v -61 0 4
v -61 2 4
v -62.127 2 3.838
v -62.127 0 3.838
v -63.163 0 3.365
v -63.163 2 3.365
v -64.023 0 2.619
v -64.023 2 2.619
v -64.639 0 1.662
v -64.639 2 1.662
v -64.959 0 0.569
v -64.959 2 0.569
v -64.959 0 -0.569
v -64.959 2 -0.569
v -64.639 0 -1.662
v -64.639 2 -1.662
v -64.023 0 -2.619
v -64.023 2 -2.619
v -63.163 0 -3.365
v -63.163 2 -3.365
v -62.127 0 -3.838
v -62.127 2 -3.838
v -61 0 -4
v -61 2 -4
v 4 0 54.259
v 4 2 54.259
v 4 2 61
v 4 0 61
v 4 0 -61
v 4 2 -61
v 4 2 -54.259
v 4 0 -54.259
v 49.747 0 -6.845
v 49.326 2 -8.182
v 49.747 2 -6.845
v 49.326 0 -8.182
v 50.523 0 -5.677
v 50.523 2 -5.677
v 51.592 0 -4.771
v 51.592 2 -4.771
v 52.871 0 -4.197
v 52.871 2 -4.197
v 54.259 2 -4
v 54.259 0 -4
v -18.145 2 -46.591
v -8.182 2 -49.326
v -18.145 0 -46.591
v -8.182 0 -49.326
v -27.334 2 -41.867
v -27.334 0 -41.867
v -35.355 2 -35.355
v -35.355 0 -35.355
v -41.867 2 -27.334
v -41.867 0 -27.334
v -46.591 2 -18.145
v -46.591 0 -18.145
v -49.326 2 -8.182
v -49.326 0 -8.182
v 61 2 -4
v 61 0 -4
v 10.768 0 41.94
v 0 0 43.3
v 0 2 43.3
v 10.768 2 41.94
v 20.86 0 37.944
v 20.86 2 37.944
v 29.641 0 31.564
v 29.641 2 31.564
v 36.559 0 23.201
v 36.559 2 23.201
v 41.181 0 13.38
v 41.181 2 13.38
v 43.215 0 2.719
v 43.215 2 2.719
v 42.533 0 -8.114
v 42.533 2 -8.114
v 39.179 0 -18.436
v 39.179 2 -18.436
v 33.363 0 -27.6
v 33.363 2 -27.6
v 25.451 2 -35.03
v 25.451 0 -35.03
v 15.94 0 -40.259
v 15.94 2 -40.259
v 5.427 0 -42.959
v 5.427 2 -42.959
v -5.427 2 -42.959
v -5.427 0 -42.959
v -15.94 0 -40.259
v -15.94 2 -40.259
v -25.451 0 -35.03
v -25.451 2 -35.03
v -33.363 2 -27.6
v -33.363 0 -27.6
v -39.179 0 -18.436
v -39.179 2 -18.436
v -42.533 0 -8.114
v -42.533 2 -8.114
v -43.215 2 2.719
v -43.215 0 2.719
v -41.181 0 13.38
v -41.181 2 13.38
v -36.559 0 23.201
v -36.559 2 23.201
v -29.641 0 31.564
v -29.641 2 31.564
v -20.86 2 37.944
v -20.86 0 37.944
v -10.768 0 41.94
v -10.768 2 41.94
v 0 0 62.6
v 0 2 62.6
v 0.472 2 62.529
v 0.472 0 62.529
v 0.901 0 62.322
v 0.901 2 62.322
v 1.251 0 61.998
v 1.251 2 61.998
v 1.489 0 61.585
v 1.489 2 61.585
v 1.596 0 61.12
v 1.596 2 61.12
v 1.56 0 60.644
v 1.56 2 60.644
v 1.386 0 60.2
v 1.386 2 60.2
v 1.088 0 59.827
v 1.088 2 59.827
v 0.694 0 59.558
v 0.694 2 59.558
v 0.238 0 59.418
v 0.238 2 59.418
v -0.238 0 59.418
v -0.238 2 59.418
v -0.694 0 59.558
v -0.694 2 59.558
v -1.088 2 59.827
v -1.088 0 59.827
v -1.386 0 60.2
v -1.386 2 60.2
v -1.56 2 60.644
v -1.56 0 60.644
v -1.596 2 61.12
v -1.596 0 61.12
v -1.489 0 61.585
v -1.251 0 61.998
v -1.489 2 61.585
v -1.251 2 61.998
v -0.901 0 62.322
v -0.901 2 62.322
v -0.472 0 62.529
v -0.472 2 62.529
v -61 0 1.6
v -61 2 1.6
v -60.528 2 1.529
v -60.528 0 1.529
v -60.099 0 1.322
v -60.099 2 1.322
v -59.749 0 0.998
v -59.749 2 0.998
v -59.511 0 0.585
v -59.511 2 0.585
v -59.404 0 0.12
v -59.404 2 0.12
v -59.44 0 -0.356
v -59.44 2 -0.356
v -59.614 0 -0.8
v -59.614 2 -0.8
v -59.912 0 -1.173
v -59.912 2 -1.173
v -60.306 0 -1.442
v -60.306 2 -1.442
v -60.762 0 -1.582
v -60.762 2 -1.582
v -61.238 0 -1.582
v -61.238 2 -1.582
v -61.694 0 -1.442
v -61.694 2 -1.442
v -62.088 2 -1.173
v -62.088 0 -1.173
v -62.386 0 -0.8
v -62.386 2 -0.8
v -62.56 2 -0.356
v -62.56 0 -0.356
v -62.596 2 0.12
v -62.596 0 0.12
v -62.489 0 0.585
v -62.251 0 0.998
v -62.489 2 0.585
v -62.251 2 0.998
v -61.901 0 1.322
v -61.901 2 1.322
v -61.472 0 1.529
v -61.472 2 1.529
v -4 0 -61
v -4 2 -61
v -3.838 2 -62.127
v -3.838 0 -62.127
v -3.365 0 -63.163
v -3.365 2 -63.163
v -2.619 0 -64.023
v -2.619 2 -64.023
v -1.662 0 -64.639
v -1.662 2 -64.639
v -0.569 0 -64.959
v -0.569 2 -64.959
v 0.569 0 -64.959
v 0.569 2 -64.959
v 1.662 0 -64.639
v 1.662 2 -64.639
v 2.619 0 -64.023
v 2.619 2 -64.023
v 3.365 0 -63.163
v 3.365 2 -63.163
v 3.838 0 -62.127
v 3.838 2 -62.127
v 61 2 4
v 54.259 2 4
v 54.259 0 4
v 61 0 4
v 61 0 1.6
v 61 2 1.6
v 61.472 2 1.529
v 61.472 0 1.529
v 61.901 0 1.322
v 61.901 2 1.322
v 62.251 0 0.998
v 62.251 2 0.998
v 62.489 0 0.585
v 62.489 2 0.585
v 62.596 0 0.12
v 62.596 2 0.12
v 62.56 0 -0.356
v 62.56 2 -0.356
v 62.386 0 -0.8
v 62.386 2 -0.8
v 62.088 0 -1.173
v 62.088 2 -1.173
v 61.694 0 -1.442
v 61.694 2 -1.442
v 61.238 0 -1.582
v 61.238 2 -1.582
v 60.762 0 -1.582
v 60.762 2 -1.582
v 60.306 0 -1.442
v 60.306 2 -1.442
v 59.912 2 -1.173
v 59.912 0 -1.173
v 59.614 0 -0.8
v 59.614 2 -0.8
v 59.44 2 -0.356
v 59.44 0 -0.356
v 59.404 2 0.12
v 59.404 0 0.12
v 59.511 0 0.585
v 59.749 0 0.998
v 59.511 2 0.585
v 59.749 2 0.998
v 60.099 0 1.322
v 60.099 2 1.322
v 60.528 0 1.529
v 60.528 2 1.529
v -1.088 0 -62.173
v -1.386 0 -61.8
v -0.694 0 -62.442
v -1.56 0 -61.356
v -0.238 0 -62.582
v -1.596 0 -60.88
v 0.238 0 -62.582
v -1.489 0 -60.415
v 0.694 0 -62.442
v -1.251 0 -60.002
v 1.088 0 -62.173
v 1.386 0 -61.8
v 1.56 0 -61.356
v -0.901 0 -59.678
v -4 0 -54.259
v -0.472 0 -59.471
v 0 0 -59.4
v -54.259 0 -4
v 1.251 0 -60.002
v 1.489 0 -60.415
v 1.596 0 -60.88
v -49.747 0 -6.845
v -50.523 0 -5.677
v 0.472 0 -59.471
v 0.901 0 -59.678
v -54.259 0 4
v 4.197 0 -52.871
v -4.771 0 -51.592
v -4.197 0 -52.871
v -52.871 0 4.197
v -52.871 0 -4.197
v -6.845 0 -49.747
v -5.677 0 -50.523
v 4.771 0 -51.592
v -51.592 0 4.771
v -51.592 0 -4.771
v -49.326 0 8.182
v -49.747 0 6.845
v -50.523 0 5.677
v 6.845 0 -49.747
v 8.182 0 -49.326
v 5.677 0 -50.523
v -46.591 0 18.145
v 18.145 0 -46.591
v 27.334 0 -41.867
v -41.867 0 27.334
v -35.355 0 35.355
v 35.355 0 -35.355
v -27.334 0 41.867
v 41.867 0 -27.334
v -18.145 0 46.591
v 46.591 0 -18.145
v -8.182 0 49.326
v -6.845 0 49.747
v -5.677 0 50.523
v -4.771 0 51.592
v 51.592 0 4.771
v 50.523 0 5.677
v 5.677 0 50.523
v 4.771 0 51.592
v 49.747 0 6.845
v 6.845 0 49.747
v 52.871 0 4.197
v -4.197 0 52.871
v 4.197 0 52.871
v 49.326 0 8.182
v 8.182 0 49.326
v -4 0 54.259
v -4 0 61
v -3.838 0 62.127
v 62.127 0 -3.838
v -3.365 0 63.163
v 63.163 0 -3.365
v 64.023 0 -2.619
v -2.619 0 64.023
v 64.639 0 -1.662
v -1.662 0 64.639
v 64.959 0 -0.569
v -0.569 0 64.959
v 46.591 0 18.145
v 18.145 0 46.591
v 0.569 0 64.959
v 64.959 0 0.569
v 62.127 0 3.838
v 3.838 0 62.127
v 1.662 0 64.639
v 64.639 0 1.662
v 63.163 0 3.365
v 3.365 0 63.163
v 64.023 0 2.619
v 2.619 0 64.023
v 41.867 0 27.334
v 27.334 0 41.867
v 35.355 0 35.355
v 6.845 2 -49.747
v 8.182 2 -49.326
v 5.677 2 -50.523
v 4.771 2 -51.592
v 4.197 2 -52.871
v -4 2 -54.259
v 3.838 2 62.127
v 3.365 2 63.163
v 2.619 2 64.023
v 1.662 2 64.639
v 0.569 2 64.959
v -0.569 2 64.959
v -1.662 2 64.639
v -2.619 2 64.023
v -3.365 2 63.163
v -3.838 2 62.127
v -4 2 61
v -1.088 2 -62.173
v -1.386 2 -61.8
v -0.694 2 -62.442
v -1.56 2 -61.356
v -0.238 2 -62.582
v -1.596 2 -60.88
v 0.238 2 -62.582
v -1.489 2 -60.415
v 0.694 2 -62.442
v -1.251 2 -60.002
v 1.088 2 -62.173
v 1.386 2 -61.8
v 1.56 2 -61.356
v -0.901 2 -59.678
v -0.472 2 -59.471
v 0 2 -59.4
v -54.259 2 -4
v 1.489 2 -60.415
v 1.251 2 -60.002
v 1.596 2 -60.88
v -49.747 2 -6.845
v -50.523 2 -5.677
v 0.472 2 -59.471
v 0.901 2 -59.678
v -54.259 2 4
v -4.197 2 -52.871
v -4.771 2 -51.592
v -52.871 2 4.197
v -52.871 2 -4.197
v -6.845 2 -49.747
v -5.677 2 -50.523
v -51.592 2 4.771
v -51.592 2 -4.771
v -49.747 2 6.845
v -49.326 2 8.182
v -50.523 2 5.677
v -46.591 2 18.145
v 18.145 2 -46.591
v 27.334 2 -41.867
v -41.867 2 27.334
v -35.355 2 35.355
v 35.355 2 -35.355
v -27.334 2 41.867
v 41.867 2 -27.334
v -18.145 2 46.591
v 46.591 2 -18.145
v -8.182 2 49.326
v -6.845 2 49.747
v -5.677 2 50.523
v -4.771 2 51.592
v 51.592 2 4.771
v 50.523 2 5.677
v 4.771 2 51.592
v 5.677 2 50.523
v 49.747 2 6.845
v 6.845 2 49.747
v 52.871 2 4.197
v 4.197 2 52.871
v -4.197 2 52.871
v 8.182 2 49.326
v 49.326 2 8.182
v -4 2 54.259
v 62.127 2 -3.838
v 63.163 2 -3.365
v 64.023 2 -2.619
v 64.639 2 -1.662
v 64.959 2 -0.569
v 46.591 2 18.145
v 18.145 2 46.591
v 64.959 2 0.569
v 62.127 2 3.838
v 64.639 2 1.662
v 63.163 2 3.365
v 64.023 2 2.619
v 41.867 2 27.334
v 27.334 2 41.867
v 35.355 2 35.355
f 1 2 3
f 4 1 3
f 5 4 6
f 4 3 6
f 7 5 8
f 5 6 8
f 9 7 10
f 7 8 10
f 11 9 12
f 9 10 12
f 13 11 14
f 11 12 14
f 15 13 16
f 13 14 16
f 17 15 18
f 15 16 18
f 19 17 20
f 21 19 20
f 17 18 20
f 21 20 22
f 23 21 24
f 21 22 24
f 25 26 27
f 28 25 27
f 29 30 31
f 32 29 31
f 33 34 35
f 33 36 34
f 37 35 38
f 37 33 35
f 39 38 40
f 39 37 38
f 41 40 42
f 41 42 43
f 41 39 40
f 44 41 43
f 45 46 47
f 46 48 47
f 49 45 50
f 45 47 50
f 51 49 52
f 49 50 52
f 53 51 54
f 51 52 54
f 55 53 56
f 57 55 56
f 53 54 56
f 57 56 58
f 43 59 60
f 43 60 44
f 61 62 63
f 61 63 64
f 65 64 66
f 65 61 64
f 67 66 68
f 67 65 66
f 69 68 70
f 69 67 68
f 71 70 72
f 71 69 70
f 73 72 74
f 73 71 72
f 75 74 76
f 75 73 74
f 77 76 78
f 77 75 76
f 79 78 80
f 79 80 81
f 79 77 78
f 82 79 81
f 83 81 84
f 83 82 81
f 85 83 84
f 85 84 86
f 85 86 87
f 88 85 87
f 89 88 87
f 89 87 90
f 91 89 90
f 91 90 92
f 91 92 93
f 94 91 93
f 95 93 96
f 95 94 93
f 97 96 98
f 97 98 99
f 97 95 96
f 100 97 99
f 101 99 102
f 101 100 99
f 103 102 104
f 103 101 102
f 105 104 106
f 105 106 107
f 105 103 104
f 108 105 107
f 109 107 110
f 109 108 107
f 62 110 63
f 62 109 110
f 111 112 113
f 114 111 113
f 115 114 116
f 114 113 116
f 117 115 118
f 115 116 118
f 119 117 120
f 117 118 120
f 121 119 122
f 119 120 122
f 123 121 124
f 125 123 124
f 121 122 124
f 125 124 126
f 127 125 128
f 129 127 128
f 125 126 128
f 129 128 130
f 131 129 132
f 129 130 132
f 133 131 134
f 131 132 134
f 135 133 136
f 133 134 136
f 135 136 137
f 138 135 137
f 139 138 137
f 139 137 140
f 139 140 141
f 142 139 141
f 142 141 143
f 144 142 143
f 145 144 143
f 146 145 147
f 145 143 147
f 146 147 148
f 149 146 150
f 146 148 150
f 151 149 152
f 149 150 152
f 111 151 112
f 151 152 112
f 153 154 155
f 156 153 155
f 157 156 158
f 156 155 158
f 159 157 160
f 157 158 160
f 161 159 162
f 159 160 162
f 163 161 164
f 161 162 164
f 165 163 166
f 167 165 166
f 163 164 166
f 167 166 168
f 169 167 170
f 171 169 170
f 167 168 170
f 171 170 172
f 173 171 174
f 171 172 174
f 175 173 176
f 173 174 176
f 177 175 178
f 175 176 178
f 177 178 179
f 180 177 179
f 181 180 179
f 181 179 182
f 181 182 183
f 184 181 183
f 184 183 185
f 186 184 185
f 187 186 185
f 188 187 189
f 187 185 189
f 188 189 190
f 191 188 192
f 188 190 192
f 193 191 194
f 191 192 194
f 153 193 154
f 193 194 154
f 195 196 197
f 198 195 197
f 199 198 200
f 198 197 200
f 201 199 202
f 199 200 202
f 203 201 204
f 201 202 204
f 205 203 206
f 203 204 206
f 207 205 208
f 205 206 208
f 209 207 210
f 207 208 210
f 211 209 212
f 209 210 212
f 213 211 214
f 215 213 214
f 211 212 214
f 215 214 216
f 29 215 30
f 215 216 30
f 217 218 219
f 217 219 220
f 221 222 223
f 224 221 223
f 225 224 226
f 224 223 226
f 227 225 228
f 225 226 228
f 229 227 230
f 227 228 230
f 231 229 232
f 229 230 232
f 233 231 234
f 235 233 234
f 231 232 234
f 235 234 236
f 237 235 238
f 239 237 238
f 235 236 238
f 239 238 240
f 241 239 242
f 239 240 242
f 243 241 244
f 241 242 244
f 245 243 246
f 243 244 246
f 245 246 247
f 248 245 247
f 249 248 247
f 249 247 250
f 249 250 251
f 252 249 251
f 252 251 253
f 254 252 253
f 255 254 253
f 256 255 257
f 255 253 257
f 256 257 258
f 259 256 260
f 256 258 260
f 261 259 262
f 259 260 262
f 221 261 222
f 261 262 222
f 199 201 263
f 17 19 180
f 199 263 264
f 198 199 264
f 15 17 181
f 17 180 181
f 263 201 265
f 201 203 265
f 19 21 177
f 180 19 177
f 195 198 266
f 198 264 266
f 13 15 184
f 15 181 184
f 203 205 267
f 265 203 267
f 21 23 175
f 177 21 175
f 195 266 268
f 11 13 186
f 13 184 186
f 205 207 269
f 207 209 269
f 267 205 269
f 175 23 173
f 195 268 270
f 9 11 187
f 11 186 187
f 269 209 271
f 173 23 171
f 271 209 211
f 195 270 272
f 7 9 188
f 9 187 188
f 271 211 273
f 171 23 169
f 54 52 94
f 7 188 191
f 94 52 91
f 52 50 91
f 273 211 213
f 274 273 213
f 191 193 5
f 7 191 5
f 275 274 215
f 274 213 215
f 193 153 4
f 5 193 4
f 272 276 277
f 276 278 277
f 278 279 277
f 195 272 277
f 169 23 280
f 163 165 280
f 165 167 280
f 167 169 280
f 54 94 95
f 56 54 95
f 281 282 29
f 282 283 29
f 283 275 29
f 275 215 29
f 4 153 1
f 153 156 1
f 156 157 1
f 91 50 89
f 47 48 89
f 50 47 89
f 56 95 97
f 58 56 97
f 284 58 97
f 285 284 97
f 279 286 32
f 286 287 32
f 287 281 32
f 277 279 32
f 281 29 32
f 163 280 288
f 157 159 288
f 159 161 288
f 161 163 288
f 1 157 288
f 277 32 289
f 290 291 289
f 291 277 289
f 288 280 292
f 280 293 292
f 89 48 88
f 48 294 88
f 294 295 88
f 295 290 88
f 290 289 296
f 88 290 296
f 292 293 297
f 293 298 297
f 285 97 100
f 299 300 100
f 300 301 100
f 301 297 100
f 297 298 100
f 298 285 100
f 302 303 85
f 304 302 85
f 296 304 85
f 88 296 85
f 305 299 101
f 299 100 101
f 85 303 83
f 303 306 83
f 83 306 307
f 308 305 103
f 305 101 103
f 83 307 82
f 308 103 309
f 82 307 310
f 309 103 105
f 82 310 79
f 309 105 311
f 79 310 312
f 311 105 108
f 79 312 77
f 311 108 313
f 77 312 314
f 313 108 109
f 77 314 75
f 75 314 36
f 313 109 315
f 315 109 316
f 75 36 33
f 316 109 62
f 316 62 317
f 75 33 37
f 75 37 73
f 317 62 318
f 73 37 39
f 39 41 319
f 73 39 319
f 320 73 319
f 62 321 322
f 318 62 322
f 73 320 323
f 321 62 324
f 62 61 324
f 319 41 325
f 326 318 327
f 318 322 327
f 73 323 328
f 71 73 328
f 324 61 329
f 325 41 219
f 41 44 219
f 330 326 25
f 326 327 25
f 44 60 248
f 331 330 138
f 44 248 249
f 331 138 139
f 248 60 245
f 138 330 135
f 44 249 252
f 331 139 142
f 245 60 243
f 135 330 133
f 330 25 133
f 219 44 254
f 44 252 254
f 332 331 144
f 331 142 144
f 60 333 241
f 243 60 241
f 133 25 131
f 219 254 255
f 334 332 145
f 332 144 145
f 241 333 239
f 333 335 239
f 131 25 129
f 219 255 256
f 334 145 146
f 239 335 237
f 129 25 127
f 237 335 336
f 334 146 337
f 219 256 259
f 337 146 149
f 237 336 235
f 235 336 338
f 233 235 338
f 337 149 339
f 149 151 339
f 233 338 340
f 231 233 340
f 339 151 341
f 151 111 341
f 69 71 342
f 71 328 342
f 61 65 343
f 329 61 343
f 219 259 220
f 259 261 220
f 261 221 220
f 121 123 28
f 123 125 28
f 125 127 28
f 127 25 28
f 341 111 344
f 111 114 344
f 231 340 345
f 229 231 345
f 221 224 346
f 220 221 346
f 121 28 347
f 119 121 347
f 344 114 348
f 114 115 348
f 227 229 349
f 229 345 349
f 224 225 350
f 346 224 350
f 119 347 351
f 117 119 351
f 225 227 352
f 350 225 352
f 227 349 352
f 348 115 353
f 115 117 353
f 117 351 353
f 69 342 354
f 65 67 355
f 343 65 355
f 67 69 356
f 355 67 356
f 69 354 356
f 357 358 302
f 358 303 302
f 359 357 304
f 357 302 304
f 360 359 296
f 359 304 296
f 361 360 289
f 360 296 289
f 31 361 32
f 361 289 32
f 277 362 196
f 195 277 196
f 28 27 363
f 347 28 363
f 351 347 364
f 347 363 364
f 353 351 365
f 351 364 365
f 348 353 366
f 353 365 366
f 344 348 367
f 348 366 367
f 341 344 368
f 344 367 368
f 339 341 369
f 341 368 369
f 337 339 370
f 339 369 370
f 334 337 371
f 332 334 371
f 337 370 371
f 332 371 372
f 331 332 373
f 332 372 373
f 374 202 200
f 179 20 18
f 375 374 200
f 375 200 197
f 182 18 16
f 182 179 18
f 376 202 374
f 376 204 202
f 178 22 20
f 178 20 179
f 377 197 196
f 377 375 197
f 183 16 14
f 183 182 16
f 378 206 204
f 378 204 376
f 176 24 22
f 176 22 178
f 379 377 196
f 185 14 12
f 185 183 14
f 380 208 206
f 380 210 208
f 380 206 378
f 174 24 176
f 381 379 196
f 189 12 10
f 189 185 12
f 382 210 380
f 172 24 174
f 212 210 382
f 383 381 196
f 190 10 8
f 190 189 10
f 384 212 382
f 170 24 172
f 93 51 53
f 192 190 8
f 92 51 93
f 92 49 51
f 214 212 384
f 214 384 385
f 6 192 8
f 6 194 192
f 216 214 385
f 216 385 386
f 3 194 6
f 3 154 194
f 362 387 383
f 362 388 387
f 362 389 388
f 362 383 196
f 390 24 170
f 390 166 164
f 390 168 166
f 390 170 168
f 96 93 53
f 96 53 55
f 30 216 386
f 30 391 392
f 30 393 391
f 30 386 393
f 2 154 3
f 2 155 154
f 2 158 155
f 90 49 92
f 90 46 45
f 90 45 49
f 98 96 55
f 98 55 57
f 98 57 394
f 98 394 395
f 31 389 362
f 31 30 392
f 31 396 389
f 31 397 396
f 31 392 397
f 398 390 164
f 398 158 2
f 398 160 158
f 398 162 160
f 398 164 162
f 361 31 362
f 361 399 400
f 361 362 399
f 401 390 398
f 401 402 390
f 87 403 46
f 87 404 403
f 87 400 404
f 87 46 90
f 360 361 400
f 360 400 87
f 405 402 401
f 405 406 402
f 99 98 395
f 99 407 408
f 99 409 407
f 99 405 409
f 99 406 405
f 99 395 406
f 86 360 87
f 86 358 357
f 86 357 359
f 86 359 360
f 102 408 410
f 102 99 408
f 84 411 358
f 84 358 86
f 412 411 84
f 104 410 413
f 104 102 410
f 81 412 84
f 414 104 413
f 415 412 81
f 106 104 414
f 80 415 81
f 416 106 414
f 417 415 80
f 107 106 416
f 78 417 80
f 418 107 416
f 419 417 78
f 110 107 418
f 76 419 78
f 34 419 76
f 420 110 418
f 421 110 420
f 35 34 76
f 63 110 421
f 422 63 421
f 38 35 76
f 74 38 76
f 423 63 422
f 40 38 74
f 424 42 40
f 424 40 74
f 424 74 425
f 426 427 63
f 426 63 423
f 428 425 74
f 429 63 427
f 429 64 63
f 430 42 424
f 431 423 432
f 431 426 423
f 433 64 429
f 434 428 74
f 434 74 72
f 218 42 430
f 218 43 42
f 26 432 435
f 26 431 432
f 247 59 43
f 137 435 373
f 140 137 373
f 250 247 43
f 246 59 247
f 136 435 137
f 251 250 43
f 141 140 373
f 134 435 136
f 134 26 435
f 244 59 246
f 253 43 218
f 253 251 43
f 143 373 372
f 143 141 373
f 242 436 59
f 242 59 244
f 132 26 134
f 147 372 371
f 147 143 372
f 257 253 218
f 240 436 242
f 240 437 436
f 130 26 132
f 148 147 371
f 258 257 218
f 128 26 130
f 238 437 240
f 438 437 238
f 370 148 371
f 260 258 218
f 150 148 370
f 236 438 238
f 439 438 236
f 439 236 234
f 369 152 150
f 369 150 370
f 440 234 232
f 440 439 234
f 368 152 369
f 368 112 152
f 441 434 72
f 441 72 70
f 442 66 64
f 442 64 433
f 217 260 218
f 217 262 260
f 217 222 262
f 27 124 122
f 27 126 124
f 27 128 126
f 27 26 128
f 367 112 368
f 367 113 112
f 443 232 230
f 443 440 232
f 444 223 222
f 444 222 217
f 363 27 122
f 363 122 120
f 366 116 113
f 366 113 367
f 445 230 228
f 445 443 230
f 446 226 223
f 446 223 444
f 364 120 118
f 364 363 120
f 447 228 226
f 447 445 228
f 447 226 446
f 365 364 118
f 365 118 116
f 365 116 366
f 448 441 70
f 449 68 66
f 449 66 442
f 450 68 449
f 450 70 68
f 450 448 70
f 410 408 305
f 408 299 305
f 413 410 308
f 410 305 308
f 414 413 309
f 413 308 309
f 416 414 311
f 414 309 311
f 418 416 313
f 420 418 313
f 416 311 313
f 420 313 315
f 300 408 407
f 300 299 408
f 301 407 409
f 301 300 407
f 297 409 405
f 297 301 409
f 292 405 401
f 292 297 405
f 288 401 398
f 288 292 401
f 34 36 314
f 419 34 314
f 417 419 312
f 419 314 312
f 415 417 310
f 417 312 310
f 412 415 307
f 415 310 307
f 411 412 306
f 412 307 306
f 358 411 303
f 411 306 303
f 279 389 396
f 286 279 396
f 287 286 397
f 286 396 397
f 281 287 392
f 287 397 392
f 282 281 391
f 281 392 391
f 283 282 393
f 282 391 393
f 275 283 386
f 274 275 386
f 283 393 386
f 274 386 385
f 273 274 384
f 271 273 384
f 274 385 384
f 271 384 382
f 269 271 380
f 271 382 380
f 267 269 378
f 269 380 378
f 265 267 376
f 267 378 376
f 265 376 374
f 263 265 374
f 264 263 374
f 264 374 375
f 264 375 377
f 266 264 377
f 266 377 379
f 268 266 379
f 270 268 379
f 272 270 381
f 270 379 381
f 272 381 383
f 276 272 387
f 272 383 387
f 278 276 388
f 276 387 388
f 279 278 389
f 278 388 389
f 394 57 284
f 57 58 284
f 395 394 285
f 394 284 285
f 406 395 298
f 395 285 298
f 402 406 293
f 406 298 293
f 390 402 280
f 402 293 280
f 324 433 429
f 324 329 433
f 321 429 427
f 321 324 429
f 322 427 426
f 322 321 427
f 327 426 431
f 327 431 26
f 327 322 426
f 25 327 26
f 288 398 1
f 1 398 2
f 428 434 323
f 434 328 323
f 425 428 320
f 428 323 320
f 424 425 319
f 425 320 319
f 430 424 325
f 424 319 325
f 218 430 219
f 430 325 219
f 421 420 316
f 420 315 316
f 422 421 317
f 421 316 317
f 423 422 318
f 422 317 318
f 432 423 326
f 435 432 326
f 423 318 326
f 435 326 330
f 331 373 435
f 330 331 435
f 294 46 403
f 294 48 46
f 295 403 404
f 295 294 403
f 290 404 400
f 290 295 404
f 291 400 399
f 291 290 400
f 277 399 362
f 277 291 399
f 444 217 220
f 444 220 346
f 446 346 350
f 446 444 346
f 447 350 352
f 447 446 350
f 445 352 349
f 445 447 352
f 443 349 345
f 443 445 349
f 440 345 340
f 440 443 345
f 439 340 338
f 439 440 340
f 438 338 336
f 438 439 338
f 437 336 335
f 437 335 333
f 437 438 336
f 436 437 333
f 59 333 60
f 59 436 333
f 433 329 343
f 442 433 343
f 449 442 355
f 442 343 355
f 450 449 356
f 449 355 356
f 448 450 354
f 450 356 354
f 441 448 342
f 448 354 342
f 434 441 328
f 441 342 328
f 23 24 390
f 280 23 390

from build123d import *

# Parameters (mm, degrees)
SKETCH_1_R      = 50
SKETCH_1_R_2    = 43.3
EXTRUDE_1_DEPTH = 2
SKETCH_2_R      = 1.6
EXTRUDE_2_DEPTH = 2
FILLET_1_R      = 5


with BuildPart() as part:
    # 草图1 → 凸台-拉伸1 (new body)
    with BuildSketch(Plane(origin=(0, 0, 0), x_dir=(1, 0, 0), z_dir=(0, 1, 0))):
        with Locations(Location((0, 0, 0), (0, 0, 270))):
            Circle(SKETCH_1_R)
        with Locations(Location((0, 0, 0), (0, 0, 270))):
            Circle(SKETCH_1_R_2, mode=Mode.SUBTRACT)
    extrude(amount=EXTRUDE_1_DEPTH)

    # 草图2 → 凸台-拉伸2 (add)
    # profile 1 of 4: a face of its own
    with BuildSketch(Plane(origin=(0, 2, 0), x_dir=(1, 0, 0), z_dir=(0, 1, 0))):
        with BuildLine():
            Line((47.683371348, 4), (47.683371348, -4))
            Line((47.683371348, -4), (61, -4))
            ThreePointArc((61, -4), (65, 0), (61, 4))
            Line((61, 4), (47.683371348, 4))
        make_face()
        with Locations(Location((61, 0, 0), (0, 0, 270))):
            Circle(SKETCH_2_R, mode=Mode.SUBTRACT)
    # profile 2 of 4: a face of its own
    with BuildSketch(Plane(origin=(0, 2, 0), x_dir=(1, 0, 0), z_dir=(0, 1, 0))):
        with BuildLine():
            Line((-4, -61), (-4, -47.683371348))
            Line((-4, -47.683371348), (4, -47.683371348))
            Line((4, -47.683371348), (4, -61))
            ThreePointArc((4, -61), (0, -65), (-4, -61))
        make_face()
        with Locations(Location((0, -61, 0), (0, 0, 270))):
            Circle(SKETCH_2_R, mode=Mode.SUBTRACT)
    # profile 3 of 4: a face of its own
    with BuildSketch(Plane(origin=(0, 2, 0), x_dir=(1, 0, 0), z_dir=(0, 1, 0))):
        with BuildLine():
            Line((-61, 4), (-47.683371348, 4))
            Line((-47.683371348, 4), (-47.683371348, -4))
            Line((-47.683371348, -4), (-61, -4))
            ThreePointArc((-61, -4), (-65, 0), (-61, 4))
        make_face()
        with Locations(Location((-61, 0, 0), (0, 0, 270))):
            Circle(SKETCH_2_R, mode=Mode.SUBTRACT)
    # profile 4 of 4: a face of its own
    with BuildSketch(Plane(origin=(0, 2, 0), x_dir=(1, 0, 0), z_dir=(0, 1, 0))):
        with BuildLine():
            Line((4, 61), (4, 47.683371348))
            Line((4, 47.683371348), (-4, 47.683371348))
            Line((-4, 47.683371348), (-4, 61))
            ThreePointArc((-4, 61), (0, 65), (4, 61))
        make_face()
        with Locations(Location((0, 61, 0), (0, 0, 270))):
            Circle(SKETCH_2_R, mode=Mode.SUBTRACT)
    extrude(amount=-EXTRUDE_2_DEPTH)

    # 圆角1
    fillet_1_edges = [part.edges().sort_by_distance(p)[0] for p in [
        (49.839743178, 1, -4),
        (49.839743178, 1, 4),
        (-4, 1, 49.839743178),
        (4, 1, 49.839743178),
        (-49.839743178, 1, -4),
        (-49.839743178, 1, 4),
        (4, 1, -49.839743178),
        (-4, 1, -49.839743178),
    ]]
    fillet(fillet_1_edges, radius=FILLET_1_R)


solid = part.part
